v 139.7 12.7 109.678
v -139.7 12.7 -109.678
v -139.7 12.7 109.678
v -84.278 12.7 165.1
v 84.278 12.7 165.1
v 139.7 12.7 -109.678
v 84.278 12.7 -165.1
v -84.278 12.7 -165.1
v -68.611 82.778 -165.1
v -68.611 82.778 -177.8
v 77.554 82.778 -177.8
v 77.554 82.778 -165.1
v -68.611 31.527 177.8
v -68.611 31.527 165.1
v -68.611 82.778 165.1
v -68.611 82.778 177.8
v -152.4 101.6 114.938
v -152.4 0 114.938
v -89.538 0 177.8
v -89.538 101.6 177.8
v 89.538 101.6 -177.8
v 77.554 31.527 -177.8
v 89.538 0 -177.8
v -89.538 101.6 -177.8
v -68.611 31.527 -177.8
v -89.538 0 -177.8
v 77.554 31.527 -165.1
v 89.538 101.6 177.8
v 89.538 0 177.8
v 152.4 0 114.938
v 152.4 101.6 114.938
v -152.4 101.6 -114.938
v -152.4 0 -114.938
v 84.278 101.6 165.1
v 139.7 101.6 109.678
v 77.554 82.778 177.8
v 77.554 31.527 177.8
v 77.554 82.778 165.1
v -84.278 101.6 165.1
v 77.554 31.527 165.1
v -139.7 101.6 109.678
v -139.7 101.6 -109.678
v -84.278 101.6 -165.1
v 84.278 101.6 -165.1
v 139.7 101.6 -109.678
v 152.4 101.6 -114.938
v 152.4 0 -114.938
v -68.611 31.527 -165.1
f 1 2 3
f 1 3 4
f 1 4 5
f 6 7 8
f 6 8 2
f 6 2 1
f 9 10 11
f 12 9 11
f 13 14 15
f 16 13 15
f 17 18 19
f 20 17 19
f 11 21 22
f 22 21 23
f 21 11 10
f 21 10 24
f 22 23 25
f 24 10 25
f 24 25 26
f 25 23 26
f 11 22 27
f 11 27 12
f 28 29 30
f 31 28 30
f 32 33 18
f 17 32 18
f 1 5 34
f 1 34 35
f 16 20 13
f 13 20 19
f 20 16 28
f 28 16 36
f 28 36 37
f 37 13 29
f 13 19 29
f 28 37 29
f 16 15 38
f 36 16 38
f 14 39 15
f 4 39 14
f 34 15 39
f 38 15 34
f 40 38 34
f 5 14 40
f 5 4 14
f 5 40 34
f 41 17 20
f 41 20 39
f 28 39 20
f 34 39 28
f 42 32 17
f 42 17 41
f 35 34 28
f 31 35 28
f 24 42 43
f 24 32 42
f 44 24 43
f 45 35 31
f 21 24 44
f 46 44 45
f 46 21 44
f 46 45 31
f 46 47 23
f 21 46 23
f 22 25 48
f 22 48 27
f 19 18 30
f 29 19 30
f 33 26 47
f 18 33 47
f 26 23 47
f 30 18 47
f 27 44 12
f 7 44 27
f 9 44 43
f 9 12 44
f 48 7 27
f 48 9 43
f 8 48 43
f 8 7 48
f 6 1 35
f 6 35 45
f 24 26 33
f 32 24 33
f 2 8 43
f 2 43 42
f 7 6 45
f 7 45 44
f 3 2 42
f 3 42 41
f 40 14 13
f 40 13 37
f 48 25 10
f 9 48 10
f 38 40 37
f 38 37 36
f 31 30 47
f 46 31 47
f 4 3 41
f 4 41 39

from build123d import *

# Parameters (mm, degrees)
BOSS_EXTRUDE1_DEPTH     = 101.6
SHELL1_T                = -12.7
CUT_EXTRUDE1_DEPTH      = 400.9996
CUT_EXTRUDE1_DEPTH_BACK = 400.9996
SKETCH2_W               = 146.165409225
SKETCH2_H               = 51.250950884


with BuildPart() as part:
    # Sketch1 → Boss-Extrude1 (new body)
    with BuildSketch(Plane(origin=(0, 0, 0), x_dir=(1, 0, 0), z_dir=(0, 1, 0))):
        Polygon((-89.538207153, 177.8), (-152.4, 114.938207153), (-152.4, -114.938207153), (-89.538207153, -177.8), (89.538207153, -177.8), (152.4, -114.938207153), (152.4, 114.938207153), (89.538207153, 177.8), align=None)
    extrude(amount=BOSS_EXTRUDE1_DEPTH)

    # Shell1
    shell1_openings = [part.faces().sort_by_distance(p)[0] for p in [
        (0, 101.6, 0),
    ]]
    offset(amount=SHELL1_T, openings=shell1_openings, kind=Kind.INTERSECTION)

    # Sketch2 → Cut-Extrude1 (cut, two sides: drawn at the far end of the back side and taken through both)
    with BuildSketch(Plane.XY.offset(177.8).offset(-CUT_EXTRUDE1_DEPTH_BACK)):
        with Locations((4.47129157, 57.152474053)):
            Rectangle(SKETCH2_W, SKETCH2_H)
    extrude(amount=CUT_EXTRUDE1_DEPTH + CUT_EXTRUDE1_DEPTH_BACK, mode=Mode.SUBTRACT)


solid = part.part
